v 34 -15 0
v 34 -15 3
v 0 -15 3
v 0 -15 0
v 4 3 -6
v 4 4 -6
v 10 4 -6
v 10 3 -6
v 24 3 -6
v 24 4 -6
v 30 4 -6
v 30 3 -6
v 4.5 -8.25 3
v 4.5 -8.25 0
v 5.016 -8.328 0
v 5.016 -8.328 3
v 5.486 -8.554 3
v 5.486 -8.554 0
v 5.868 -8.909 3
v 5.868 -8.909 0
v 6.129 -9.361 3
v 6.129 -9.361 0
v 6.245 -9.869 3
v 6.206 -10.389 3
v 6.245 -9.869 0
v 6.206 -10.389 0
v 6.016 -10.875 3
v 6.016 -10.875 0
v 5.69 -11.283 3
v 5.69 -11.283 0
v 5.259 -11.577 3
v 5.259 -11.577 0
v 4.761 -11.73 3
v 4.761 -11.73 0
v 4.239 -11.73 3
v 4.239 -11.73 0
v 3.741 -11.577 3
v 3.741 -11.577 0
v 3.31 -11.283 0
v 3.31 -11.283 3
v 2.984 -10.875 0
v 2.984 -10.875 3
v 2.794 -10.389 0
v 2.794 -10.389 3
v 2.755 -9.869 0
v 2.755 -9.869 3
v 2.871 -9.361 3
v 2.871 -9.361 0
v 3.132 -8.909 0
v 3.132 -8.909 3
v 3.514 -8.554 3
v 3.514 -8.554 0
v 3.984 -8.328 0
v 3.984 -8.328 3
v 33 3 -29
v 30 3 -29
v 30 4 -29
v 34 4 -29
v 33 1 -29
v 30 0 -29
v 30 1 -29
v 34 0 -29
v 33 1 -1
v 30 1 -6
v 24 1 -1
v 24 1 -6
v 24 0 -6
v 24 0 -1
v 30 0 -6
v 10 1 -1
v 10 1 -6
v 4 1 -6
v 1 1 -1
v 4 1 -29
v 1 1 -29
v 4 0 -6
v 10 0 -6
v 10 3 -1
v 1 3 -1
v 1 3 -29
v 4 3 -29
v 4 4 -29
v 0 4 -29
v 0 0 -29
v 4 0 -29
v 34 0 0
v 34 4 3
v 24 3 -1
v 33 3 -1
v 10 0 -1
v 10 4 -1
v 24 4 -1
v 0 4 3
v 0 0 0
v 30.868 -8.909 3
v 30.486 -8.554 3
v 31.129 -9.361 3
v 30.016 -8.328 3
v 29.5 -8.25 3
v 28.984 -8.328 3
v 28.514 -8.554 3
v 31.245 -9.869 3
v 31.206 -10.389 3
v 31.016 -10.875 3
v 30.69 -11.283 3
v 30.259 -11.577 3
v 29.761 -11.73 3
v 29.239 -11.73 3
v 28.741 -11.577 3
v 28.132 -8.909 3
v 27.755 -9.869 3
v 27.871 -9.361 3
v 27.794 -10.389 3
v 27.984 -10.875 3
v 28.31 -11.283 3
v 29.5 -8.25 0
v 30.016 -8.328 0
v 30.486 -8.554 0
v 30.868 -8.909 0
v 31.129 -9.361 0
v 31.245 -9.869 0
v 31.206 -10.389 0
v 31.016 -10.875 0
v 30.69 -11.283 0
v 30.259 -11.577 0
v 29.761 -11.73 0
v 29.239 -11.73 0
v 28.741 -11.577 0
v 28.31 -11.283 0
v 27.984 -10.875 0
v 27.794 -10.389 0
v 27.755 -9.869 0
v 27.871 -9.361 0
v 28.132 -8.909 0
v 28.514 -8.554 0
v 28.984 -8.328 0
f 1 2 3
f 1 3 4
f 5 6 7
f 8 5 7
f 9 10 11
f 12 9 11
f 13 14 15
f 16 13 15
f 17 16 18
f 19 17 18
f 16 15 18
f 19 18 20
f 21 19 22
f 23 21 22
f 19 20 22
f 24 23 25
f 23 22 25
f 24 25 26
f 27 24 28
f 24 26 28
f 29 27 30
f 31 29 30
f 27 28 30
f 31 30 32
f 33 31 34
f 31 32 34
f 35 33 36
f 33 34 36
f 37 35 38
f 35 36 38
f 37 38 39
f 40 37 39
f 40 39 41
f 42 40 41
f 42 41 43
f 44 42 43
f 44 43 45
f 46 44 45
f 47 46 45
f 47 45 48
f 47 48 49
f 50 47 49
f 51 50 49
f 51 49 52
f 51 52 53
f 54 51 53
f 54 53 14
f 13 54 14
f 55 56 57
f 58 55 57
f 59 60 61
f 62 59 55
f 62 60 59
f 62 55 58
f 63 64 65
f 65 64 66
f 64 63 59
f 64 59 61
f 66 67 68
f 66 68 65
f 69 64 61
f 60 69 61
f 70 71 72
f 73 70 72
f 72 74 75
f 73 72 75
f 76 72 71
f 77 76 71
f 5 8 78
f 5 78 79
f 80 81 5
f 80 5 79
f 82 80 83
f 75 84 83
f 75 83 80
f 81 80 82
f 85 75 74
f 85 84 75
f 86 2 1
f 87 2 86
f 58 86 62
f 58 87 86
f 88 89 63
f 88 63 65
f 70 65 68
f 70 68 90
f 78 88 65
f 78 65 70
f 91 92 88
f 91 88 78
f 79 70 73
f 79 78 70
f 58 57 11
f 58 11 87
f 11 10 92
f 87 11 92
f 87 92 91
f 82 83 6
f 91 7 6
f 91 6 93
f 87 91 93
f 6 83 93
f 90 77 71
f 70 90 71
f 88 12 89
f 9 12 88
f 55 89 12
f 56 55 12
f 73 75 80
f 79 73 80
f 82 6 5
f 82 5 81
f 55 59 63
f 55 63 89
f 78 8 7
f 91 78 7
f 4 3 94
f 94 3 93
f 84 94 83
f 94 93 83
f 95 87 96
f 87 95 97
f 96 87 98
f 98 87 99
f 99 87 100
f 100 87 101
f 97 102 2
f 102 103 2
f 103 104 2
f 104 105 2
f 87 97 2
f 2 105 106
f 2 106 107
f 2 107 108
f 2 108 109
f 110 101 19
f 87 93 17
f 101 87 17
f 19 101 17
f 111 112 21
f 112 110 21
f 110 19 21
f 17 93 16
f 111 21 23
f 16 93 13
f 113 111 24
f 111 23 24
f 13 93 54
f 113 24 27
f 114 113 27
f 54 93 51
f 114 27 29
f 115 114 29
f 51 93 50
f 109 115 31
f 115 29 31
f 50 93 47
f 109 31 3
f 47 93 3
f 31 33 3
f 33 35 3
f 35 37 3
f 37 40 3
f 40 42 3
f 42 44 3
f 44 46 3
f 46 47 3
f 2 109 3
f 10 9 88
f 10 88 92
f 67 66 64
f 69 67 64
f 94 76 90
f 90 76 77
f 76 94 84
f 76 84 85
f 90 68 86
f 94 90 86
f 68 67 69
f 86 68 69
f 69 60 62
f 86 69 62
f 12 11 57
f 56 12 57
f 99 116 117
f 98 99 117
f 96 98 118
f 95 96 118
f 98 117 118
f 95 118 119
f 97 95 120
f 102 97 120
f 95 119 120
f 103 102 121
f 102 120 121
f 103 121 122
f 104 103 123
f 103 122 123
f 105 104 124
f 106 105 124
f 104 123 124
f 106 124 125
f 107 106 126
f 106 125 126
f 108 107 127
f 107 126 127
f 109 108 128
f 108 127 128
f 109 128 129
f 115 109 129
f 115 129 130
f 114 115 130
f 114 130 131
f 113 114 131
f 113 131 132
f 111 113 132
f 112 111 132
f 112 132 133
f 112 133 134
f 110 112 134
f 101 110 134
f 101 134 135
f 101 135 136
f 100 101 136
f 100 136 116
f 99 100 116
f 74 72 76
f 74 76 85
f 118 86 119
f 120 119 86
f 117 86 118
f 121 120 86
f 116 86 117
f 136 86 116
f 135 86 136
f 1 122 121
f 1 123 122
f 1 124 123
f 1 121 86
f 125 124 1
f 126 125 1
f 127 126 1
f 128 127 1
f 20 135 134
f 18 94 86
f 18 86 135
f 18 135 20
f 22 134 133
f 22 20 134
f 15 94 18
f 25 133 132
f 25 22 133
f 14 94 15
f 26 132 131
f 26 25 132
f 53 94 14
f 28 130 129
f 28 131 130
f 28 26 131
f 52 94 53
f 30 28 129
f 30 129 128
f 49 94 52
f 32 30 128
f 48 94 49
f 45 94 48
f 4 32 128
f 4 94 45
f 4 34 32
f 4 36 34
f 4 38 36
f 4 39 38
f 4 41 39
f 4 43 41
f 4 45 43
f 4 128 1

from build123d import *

# Parameters (mm, degrees)
SKETCH1_W           = 34
SKETCH1_H           = 29
BOSS_EXTRUDE1_DEPTH = 4
SKETCH2_W           = 26
SKETCH2_H           = 23
CUT_EXTRUDE1_DEPTH  = 45.866468548
SKETCH3_W           = 32
SKETCH3_H           = 2
CUT_EXTRUDE2_DEPTH  = 28
BOSS_EXTRUDE2_DEPTH = 34
SKETCH5_R           = 1.75
CUT_EXTRUDE3_DEPTH  = 48.138094998
SKETCH6_W           = 14
SKETCH6_H           = 4
CUT_EXTRUDE4_DEPTH  = 5


with BuildPart() as part:
    # Sketch1 → Boss-Extrude1 (new body)
    with BuildSketch(Plane(origin=(0, 0, 0), x_dir=(1, 0, 0), z_dir=(0, 1, 0))):
        with Locations((17, 14.5)):
            Rectangle(SKETCH1_W, SKETCH1_H)
    extrude(amount=BOSS_EXTRUDE1_DEPTH)

    # Sketch2 → Cut-Extrude1 (cut, through all)
    with BuildSketch(Plane(origin=(0, 4, 0), x_dir=(1, 0, 0), z_dir=(0, 1, 0))):
        with Locations((17, 17.5)):
            Rectangle(SKETCH2_W, SKETCH2_H)
    extrude(amount=-CUT_EXTRUDE1_DEPTH, mode=Mode.SUBTRACT)

    # Sketch3 → Cut-Extrude2 (cut)
    with BuildSketch(Plane(origin=(0, 0, -29), x_dir=(-1, 0, 0), z_dir=(0, 0, -1))):
        with Locations((-17, 2)):
            Rectangle(SKETCH3_W, SKETCH3_H)
    extrude(amount=-CUT_EXTRUDE2_DEPTH, mode=Mode.SUBTRACT)

    # Sketch4 → Boss-Extrude2 (add)
    with BuildSketch(Plane.ZY):
        Polygon((0, 4), (3, 4), (3, -15), (0, -15), (0, 0), align=None)
    extrude(amount=-BOSS_EXTRUDE2_DEPTH)

    # Sketch5 → Cut-Extrude3 (cut, through all)
    with BuildSketch(Plane(origin=(0, 0, 0), x_dir=(-1, 0, 0), z_dir=(0, 0, -1))):
        with Locations(Location((-29.5, -10, 0), (0, 0, 90))):
            Circle(SKETCH5_R)
        with Locations(Location((-4.5, -10, 0), (0, 0, 90))):
            Circle(SKETCH5_R)
    extrude(amount=-CUT_EXTRUDE3_DEPTH, mode=Mode.SUBTRACT)

    # Sketch6 → Cut-Extrude4 (cut)
    with BuildSketch(Plane(origin=(0, 0, -6), x_dir=(-1, 0, 0), z_dir=(0, 0, -1))):
        with Locations((-17, 2)):
            Rectangle(SKETCH6_W, SKETCH6_H)
    extrude(amount=-CUT_EXTRUDE4_DEPTH, mode=Mode.SUBTRACT)


solid = part.part
